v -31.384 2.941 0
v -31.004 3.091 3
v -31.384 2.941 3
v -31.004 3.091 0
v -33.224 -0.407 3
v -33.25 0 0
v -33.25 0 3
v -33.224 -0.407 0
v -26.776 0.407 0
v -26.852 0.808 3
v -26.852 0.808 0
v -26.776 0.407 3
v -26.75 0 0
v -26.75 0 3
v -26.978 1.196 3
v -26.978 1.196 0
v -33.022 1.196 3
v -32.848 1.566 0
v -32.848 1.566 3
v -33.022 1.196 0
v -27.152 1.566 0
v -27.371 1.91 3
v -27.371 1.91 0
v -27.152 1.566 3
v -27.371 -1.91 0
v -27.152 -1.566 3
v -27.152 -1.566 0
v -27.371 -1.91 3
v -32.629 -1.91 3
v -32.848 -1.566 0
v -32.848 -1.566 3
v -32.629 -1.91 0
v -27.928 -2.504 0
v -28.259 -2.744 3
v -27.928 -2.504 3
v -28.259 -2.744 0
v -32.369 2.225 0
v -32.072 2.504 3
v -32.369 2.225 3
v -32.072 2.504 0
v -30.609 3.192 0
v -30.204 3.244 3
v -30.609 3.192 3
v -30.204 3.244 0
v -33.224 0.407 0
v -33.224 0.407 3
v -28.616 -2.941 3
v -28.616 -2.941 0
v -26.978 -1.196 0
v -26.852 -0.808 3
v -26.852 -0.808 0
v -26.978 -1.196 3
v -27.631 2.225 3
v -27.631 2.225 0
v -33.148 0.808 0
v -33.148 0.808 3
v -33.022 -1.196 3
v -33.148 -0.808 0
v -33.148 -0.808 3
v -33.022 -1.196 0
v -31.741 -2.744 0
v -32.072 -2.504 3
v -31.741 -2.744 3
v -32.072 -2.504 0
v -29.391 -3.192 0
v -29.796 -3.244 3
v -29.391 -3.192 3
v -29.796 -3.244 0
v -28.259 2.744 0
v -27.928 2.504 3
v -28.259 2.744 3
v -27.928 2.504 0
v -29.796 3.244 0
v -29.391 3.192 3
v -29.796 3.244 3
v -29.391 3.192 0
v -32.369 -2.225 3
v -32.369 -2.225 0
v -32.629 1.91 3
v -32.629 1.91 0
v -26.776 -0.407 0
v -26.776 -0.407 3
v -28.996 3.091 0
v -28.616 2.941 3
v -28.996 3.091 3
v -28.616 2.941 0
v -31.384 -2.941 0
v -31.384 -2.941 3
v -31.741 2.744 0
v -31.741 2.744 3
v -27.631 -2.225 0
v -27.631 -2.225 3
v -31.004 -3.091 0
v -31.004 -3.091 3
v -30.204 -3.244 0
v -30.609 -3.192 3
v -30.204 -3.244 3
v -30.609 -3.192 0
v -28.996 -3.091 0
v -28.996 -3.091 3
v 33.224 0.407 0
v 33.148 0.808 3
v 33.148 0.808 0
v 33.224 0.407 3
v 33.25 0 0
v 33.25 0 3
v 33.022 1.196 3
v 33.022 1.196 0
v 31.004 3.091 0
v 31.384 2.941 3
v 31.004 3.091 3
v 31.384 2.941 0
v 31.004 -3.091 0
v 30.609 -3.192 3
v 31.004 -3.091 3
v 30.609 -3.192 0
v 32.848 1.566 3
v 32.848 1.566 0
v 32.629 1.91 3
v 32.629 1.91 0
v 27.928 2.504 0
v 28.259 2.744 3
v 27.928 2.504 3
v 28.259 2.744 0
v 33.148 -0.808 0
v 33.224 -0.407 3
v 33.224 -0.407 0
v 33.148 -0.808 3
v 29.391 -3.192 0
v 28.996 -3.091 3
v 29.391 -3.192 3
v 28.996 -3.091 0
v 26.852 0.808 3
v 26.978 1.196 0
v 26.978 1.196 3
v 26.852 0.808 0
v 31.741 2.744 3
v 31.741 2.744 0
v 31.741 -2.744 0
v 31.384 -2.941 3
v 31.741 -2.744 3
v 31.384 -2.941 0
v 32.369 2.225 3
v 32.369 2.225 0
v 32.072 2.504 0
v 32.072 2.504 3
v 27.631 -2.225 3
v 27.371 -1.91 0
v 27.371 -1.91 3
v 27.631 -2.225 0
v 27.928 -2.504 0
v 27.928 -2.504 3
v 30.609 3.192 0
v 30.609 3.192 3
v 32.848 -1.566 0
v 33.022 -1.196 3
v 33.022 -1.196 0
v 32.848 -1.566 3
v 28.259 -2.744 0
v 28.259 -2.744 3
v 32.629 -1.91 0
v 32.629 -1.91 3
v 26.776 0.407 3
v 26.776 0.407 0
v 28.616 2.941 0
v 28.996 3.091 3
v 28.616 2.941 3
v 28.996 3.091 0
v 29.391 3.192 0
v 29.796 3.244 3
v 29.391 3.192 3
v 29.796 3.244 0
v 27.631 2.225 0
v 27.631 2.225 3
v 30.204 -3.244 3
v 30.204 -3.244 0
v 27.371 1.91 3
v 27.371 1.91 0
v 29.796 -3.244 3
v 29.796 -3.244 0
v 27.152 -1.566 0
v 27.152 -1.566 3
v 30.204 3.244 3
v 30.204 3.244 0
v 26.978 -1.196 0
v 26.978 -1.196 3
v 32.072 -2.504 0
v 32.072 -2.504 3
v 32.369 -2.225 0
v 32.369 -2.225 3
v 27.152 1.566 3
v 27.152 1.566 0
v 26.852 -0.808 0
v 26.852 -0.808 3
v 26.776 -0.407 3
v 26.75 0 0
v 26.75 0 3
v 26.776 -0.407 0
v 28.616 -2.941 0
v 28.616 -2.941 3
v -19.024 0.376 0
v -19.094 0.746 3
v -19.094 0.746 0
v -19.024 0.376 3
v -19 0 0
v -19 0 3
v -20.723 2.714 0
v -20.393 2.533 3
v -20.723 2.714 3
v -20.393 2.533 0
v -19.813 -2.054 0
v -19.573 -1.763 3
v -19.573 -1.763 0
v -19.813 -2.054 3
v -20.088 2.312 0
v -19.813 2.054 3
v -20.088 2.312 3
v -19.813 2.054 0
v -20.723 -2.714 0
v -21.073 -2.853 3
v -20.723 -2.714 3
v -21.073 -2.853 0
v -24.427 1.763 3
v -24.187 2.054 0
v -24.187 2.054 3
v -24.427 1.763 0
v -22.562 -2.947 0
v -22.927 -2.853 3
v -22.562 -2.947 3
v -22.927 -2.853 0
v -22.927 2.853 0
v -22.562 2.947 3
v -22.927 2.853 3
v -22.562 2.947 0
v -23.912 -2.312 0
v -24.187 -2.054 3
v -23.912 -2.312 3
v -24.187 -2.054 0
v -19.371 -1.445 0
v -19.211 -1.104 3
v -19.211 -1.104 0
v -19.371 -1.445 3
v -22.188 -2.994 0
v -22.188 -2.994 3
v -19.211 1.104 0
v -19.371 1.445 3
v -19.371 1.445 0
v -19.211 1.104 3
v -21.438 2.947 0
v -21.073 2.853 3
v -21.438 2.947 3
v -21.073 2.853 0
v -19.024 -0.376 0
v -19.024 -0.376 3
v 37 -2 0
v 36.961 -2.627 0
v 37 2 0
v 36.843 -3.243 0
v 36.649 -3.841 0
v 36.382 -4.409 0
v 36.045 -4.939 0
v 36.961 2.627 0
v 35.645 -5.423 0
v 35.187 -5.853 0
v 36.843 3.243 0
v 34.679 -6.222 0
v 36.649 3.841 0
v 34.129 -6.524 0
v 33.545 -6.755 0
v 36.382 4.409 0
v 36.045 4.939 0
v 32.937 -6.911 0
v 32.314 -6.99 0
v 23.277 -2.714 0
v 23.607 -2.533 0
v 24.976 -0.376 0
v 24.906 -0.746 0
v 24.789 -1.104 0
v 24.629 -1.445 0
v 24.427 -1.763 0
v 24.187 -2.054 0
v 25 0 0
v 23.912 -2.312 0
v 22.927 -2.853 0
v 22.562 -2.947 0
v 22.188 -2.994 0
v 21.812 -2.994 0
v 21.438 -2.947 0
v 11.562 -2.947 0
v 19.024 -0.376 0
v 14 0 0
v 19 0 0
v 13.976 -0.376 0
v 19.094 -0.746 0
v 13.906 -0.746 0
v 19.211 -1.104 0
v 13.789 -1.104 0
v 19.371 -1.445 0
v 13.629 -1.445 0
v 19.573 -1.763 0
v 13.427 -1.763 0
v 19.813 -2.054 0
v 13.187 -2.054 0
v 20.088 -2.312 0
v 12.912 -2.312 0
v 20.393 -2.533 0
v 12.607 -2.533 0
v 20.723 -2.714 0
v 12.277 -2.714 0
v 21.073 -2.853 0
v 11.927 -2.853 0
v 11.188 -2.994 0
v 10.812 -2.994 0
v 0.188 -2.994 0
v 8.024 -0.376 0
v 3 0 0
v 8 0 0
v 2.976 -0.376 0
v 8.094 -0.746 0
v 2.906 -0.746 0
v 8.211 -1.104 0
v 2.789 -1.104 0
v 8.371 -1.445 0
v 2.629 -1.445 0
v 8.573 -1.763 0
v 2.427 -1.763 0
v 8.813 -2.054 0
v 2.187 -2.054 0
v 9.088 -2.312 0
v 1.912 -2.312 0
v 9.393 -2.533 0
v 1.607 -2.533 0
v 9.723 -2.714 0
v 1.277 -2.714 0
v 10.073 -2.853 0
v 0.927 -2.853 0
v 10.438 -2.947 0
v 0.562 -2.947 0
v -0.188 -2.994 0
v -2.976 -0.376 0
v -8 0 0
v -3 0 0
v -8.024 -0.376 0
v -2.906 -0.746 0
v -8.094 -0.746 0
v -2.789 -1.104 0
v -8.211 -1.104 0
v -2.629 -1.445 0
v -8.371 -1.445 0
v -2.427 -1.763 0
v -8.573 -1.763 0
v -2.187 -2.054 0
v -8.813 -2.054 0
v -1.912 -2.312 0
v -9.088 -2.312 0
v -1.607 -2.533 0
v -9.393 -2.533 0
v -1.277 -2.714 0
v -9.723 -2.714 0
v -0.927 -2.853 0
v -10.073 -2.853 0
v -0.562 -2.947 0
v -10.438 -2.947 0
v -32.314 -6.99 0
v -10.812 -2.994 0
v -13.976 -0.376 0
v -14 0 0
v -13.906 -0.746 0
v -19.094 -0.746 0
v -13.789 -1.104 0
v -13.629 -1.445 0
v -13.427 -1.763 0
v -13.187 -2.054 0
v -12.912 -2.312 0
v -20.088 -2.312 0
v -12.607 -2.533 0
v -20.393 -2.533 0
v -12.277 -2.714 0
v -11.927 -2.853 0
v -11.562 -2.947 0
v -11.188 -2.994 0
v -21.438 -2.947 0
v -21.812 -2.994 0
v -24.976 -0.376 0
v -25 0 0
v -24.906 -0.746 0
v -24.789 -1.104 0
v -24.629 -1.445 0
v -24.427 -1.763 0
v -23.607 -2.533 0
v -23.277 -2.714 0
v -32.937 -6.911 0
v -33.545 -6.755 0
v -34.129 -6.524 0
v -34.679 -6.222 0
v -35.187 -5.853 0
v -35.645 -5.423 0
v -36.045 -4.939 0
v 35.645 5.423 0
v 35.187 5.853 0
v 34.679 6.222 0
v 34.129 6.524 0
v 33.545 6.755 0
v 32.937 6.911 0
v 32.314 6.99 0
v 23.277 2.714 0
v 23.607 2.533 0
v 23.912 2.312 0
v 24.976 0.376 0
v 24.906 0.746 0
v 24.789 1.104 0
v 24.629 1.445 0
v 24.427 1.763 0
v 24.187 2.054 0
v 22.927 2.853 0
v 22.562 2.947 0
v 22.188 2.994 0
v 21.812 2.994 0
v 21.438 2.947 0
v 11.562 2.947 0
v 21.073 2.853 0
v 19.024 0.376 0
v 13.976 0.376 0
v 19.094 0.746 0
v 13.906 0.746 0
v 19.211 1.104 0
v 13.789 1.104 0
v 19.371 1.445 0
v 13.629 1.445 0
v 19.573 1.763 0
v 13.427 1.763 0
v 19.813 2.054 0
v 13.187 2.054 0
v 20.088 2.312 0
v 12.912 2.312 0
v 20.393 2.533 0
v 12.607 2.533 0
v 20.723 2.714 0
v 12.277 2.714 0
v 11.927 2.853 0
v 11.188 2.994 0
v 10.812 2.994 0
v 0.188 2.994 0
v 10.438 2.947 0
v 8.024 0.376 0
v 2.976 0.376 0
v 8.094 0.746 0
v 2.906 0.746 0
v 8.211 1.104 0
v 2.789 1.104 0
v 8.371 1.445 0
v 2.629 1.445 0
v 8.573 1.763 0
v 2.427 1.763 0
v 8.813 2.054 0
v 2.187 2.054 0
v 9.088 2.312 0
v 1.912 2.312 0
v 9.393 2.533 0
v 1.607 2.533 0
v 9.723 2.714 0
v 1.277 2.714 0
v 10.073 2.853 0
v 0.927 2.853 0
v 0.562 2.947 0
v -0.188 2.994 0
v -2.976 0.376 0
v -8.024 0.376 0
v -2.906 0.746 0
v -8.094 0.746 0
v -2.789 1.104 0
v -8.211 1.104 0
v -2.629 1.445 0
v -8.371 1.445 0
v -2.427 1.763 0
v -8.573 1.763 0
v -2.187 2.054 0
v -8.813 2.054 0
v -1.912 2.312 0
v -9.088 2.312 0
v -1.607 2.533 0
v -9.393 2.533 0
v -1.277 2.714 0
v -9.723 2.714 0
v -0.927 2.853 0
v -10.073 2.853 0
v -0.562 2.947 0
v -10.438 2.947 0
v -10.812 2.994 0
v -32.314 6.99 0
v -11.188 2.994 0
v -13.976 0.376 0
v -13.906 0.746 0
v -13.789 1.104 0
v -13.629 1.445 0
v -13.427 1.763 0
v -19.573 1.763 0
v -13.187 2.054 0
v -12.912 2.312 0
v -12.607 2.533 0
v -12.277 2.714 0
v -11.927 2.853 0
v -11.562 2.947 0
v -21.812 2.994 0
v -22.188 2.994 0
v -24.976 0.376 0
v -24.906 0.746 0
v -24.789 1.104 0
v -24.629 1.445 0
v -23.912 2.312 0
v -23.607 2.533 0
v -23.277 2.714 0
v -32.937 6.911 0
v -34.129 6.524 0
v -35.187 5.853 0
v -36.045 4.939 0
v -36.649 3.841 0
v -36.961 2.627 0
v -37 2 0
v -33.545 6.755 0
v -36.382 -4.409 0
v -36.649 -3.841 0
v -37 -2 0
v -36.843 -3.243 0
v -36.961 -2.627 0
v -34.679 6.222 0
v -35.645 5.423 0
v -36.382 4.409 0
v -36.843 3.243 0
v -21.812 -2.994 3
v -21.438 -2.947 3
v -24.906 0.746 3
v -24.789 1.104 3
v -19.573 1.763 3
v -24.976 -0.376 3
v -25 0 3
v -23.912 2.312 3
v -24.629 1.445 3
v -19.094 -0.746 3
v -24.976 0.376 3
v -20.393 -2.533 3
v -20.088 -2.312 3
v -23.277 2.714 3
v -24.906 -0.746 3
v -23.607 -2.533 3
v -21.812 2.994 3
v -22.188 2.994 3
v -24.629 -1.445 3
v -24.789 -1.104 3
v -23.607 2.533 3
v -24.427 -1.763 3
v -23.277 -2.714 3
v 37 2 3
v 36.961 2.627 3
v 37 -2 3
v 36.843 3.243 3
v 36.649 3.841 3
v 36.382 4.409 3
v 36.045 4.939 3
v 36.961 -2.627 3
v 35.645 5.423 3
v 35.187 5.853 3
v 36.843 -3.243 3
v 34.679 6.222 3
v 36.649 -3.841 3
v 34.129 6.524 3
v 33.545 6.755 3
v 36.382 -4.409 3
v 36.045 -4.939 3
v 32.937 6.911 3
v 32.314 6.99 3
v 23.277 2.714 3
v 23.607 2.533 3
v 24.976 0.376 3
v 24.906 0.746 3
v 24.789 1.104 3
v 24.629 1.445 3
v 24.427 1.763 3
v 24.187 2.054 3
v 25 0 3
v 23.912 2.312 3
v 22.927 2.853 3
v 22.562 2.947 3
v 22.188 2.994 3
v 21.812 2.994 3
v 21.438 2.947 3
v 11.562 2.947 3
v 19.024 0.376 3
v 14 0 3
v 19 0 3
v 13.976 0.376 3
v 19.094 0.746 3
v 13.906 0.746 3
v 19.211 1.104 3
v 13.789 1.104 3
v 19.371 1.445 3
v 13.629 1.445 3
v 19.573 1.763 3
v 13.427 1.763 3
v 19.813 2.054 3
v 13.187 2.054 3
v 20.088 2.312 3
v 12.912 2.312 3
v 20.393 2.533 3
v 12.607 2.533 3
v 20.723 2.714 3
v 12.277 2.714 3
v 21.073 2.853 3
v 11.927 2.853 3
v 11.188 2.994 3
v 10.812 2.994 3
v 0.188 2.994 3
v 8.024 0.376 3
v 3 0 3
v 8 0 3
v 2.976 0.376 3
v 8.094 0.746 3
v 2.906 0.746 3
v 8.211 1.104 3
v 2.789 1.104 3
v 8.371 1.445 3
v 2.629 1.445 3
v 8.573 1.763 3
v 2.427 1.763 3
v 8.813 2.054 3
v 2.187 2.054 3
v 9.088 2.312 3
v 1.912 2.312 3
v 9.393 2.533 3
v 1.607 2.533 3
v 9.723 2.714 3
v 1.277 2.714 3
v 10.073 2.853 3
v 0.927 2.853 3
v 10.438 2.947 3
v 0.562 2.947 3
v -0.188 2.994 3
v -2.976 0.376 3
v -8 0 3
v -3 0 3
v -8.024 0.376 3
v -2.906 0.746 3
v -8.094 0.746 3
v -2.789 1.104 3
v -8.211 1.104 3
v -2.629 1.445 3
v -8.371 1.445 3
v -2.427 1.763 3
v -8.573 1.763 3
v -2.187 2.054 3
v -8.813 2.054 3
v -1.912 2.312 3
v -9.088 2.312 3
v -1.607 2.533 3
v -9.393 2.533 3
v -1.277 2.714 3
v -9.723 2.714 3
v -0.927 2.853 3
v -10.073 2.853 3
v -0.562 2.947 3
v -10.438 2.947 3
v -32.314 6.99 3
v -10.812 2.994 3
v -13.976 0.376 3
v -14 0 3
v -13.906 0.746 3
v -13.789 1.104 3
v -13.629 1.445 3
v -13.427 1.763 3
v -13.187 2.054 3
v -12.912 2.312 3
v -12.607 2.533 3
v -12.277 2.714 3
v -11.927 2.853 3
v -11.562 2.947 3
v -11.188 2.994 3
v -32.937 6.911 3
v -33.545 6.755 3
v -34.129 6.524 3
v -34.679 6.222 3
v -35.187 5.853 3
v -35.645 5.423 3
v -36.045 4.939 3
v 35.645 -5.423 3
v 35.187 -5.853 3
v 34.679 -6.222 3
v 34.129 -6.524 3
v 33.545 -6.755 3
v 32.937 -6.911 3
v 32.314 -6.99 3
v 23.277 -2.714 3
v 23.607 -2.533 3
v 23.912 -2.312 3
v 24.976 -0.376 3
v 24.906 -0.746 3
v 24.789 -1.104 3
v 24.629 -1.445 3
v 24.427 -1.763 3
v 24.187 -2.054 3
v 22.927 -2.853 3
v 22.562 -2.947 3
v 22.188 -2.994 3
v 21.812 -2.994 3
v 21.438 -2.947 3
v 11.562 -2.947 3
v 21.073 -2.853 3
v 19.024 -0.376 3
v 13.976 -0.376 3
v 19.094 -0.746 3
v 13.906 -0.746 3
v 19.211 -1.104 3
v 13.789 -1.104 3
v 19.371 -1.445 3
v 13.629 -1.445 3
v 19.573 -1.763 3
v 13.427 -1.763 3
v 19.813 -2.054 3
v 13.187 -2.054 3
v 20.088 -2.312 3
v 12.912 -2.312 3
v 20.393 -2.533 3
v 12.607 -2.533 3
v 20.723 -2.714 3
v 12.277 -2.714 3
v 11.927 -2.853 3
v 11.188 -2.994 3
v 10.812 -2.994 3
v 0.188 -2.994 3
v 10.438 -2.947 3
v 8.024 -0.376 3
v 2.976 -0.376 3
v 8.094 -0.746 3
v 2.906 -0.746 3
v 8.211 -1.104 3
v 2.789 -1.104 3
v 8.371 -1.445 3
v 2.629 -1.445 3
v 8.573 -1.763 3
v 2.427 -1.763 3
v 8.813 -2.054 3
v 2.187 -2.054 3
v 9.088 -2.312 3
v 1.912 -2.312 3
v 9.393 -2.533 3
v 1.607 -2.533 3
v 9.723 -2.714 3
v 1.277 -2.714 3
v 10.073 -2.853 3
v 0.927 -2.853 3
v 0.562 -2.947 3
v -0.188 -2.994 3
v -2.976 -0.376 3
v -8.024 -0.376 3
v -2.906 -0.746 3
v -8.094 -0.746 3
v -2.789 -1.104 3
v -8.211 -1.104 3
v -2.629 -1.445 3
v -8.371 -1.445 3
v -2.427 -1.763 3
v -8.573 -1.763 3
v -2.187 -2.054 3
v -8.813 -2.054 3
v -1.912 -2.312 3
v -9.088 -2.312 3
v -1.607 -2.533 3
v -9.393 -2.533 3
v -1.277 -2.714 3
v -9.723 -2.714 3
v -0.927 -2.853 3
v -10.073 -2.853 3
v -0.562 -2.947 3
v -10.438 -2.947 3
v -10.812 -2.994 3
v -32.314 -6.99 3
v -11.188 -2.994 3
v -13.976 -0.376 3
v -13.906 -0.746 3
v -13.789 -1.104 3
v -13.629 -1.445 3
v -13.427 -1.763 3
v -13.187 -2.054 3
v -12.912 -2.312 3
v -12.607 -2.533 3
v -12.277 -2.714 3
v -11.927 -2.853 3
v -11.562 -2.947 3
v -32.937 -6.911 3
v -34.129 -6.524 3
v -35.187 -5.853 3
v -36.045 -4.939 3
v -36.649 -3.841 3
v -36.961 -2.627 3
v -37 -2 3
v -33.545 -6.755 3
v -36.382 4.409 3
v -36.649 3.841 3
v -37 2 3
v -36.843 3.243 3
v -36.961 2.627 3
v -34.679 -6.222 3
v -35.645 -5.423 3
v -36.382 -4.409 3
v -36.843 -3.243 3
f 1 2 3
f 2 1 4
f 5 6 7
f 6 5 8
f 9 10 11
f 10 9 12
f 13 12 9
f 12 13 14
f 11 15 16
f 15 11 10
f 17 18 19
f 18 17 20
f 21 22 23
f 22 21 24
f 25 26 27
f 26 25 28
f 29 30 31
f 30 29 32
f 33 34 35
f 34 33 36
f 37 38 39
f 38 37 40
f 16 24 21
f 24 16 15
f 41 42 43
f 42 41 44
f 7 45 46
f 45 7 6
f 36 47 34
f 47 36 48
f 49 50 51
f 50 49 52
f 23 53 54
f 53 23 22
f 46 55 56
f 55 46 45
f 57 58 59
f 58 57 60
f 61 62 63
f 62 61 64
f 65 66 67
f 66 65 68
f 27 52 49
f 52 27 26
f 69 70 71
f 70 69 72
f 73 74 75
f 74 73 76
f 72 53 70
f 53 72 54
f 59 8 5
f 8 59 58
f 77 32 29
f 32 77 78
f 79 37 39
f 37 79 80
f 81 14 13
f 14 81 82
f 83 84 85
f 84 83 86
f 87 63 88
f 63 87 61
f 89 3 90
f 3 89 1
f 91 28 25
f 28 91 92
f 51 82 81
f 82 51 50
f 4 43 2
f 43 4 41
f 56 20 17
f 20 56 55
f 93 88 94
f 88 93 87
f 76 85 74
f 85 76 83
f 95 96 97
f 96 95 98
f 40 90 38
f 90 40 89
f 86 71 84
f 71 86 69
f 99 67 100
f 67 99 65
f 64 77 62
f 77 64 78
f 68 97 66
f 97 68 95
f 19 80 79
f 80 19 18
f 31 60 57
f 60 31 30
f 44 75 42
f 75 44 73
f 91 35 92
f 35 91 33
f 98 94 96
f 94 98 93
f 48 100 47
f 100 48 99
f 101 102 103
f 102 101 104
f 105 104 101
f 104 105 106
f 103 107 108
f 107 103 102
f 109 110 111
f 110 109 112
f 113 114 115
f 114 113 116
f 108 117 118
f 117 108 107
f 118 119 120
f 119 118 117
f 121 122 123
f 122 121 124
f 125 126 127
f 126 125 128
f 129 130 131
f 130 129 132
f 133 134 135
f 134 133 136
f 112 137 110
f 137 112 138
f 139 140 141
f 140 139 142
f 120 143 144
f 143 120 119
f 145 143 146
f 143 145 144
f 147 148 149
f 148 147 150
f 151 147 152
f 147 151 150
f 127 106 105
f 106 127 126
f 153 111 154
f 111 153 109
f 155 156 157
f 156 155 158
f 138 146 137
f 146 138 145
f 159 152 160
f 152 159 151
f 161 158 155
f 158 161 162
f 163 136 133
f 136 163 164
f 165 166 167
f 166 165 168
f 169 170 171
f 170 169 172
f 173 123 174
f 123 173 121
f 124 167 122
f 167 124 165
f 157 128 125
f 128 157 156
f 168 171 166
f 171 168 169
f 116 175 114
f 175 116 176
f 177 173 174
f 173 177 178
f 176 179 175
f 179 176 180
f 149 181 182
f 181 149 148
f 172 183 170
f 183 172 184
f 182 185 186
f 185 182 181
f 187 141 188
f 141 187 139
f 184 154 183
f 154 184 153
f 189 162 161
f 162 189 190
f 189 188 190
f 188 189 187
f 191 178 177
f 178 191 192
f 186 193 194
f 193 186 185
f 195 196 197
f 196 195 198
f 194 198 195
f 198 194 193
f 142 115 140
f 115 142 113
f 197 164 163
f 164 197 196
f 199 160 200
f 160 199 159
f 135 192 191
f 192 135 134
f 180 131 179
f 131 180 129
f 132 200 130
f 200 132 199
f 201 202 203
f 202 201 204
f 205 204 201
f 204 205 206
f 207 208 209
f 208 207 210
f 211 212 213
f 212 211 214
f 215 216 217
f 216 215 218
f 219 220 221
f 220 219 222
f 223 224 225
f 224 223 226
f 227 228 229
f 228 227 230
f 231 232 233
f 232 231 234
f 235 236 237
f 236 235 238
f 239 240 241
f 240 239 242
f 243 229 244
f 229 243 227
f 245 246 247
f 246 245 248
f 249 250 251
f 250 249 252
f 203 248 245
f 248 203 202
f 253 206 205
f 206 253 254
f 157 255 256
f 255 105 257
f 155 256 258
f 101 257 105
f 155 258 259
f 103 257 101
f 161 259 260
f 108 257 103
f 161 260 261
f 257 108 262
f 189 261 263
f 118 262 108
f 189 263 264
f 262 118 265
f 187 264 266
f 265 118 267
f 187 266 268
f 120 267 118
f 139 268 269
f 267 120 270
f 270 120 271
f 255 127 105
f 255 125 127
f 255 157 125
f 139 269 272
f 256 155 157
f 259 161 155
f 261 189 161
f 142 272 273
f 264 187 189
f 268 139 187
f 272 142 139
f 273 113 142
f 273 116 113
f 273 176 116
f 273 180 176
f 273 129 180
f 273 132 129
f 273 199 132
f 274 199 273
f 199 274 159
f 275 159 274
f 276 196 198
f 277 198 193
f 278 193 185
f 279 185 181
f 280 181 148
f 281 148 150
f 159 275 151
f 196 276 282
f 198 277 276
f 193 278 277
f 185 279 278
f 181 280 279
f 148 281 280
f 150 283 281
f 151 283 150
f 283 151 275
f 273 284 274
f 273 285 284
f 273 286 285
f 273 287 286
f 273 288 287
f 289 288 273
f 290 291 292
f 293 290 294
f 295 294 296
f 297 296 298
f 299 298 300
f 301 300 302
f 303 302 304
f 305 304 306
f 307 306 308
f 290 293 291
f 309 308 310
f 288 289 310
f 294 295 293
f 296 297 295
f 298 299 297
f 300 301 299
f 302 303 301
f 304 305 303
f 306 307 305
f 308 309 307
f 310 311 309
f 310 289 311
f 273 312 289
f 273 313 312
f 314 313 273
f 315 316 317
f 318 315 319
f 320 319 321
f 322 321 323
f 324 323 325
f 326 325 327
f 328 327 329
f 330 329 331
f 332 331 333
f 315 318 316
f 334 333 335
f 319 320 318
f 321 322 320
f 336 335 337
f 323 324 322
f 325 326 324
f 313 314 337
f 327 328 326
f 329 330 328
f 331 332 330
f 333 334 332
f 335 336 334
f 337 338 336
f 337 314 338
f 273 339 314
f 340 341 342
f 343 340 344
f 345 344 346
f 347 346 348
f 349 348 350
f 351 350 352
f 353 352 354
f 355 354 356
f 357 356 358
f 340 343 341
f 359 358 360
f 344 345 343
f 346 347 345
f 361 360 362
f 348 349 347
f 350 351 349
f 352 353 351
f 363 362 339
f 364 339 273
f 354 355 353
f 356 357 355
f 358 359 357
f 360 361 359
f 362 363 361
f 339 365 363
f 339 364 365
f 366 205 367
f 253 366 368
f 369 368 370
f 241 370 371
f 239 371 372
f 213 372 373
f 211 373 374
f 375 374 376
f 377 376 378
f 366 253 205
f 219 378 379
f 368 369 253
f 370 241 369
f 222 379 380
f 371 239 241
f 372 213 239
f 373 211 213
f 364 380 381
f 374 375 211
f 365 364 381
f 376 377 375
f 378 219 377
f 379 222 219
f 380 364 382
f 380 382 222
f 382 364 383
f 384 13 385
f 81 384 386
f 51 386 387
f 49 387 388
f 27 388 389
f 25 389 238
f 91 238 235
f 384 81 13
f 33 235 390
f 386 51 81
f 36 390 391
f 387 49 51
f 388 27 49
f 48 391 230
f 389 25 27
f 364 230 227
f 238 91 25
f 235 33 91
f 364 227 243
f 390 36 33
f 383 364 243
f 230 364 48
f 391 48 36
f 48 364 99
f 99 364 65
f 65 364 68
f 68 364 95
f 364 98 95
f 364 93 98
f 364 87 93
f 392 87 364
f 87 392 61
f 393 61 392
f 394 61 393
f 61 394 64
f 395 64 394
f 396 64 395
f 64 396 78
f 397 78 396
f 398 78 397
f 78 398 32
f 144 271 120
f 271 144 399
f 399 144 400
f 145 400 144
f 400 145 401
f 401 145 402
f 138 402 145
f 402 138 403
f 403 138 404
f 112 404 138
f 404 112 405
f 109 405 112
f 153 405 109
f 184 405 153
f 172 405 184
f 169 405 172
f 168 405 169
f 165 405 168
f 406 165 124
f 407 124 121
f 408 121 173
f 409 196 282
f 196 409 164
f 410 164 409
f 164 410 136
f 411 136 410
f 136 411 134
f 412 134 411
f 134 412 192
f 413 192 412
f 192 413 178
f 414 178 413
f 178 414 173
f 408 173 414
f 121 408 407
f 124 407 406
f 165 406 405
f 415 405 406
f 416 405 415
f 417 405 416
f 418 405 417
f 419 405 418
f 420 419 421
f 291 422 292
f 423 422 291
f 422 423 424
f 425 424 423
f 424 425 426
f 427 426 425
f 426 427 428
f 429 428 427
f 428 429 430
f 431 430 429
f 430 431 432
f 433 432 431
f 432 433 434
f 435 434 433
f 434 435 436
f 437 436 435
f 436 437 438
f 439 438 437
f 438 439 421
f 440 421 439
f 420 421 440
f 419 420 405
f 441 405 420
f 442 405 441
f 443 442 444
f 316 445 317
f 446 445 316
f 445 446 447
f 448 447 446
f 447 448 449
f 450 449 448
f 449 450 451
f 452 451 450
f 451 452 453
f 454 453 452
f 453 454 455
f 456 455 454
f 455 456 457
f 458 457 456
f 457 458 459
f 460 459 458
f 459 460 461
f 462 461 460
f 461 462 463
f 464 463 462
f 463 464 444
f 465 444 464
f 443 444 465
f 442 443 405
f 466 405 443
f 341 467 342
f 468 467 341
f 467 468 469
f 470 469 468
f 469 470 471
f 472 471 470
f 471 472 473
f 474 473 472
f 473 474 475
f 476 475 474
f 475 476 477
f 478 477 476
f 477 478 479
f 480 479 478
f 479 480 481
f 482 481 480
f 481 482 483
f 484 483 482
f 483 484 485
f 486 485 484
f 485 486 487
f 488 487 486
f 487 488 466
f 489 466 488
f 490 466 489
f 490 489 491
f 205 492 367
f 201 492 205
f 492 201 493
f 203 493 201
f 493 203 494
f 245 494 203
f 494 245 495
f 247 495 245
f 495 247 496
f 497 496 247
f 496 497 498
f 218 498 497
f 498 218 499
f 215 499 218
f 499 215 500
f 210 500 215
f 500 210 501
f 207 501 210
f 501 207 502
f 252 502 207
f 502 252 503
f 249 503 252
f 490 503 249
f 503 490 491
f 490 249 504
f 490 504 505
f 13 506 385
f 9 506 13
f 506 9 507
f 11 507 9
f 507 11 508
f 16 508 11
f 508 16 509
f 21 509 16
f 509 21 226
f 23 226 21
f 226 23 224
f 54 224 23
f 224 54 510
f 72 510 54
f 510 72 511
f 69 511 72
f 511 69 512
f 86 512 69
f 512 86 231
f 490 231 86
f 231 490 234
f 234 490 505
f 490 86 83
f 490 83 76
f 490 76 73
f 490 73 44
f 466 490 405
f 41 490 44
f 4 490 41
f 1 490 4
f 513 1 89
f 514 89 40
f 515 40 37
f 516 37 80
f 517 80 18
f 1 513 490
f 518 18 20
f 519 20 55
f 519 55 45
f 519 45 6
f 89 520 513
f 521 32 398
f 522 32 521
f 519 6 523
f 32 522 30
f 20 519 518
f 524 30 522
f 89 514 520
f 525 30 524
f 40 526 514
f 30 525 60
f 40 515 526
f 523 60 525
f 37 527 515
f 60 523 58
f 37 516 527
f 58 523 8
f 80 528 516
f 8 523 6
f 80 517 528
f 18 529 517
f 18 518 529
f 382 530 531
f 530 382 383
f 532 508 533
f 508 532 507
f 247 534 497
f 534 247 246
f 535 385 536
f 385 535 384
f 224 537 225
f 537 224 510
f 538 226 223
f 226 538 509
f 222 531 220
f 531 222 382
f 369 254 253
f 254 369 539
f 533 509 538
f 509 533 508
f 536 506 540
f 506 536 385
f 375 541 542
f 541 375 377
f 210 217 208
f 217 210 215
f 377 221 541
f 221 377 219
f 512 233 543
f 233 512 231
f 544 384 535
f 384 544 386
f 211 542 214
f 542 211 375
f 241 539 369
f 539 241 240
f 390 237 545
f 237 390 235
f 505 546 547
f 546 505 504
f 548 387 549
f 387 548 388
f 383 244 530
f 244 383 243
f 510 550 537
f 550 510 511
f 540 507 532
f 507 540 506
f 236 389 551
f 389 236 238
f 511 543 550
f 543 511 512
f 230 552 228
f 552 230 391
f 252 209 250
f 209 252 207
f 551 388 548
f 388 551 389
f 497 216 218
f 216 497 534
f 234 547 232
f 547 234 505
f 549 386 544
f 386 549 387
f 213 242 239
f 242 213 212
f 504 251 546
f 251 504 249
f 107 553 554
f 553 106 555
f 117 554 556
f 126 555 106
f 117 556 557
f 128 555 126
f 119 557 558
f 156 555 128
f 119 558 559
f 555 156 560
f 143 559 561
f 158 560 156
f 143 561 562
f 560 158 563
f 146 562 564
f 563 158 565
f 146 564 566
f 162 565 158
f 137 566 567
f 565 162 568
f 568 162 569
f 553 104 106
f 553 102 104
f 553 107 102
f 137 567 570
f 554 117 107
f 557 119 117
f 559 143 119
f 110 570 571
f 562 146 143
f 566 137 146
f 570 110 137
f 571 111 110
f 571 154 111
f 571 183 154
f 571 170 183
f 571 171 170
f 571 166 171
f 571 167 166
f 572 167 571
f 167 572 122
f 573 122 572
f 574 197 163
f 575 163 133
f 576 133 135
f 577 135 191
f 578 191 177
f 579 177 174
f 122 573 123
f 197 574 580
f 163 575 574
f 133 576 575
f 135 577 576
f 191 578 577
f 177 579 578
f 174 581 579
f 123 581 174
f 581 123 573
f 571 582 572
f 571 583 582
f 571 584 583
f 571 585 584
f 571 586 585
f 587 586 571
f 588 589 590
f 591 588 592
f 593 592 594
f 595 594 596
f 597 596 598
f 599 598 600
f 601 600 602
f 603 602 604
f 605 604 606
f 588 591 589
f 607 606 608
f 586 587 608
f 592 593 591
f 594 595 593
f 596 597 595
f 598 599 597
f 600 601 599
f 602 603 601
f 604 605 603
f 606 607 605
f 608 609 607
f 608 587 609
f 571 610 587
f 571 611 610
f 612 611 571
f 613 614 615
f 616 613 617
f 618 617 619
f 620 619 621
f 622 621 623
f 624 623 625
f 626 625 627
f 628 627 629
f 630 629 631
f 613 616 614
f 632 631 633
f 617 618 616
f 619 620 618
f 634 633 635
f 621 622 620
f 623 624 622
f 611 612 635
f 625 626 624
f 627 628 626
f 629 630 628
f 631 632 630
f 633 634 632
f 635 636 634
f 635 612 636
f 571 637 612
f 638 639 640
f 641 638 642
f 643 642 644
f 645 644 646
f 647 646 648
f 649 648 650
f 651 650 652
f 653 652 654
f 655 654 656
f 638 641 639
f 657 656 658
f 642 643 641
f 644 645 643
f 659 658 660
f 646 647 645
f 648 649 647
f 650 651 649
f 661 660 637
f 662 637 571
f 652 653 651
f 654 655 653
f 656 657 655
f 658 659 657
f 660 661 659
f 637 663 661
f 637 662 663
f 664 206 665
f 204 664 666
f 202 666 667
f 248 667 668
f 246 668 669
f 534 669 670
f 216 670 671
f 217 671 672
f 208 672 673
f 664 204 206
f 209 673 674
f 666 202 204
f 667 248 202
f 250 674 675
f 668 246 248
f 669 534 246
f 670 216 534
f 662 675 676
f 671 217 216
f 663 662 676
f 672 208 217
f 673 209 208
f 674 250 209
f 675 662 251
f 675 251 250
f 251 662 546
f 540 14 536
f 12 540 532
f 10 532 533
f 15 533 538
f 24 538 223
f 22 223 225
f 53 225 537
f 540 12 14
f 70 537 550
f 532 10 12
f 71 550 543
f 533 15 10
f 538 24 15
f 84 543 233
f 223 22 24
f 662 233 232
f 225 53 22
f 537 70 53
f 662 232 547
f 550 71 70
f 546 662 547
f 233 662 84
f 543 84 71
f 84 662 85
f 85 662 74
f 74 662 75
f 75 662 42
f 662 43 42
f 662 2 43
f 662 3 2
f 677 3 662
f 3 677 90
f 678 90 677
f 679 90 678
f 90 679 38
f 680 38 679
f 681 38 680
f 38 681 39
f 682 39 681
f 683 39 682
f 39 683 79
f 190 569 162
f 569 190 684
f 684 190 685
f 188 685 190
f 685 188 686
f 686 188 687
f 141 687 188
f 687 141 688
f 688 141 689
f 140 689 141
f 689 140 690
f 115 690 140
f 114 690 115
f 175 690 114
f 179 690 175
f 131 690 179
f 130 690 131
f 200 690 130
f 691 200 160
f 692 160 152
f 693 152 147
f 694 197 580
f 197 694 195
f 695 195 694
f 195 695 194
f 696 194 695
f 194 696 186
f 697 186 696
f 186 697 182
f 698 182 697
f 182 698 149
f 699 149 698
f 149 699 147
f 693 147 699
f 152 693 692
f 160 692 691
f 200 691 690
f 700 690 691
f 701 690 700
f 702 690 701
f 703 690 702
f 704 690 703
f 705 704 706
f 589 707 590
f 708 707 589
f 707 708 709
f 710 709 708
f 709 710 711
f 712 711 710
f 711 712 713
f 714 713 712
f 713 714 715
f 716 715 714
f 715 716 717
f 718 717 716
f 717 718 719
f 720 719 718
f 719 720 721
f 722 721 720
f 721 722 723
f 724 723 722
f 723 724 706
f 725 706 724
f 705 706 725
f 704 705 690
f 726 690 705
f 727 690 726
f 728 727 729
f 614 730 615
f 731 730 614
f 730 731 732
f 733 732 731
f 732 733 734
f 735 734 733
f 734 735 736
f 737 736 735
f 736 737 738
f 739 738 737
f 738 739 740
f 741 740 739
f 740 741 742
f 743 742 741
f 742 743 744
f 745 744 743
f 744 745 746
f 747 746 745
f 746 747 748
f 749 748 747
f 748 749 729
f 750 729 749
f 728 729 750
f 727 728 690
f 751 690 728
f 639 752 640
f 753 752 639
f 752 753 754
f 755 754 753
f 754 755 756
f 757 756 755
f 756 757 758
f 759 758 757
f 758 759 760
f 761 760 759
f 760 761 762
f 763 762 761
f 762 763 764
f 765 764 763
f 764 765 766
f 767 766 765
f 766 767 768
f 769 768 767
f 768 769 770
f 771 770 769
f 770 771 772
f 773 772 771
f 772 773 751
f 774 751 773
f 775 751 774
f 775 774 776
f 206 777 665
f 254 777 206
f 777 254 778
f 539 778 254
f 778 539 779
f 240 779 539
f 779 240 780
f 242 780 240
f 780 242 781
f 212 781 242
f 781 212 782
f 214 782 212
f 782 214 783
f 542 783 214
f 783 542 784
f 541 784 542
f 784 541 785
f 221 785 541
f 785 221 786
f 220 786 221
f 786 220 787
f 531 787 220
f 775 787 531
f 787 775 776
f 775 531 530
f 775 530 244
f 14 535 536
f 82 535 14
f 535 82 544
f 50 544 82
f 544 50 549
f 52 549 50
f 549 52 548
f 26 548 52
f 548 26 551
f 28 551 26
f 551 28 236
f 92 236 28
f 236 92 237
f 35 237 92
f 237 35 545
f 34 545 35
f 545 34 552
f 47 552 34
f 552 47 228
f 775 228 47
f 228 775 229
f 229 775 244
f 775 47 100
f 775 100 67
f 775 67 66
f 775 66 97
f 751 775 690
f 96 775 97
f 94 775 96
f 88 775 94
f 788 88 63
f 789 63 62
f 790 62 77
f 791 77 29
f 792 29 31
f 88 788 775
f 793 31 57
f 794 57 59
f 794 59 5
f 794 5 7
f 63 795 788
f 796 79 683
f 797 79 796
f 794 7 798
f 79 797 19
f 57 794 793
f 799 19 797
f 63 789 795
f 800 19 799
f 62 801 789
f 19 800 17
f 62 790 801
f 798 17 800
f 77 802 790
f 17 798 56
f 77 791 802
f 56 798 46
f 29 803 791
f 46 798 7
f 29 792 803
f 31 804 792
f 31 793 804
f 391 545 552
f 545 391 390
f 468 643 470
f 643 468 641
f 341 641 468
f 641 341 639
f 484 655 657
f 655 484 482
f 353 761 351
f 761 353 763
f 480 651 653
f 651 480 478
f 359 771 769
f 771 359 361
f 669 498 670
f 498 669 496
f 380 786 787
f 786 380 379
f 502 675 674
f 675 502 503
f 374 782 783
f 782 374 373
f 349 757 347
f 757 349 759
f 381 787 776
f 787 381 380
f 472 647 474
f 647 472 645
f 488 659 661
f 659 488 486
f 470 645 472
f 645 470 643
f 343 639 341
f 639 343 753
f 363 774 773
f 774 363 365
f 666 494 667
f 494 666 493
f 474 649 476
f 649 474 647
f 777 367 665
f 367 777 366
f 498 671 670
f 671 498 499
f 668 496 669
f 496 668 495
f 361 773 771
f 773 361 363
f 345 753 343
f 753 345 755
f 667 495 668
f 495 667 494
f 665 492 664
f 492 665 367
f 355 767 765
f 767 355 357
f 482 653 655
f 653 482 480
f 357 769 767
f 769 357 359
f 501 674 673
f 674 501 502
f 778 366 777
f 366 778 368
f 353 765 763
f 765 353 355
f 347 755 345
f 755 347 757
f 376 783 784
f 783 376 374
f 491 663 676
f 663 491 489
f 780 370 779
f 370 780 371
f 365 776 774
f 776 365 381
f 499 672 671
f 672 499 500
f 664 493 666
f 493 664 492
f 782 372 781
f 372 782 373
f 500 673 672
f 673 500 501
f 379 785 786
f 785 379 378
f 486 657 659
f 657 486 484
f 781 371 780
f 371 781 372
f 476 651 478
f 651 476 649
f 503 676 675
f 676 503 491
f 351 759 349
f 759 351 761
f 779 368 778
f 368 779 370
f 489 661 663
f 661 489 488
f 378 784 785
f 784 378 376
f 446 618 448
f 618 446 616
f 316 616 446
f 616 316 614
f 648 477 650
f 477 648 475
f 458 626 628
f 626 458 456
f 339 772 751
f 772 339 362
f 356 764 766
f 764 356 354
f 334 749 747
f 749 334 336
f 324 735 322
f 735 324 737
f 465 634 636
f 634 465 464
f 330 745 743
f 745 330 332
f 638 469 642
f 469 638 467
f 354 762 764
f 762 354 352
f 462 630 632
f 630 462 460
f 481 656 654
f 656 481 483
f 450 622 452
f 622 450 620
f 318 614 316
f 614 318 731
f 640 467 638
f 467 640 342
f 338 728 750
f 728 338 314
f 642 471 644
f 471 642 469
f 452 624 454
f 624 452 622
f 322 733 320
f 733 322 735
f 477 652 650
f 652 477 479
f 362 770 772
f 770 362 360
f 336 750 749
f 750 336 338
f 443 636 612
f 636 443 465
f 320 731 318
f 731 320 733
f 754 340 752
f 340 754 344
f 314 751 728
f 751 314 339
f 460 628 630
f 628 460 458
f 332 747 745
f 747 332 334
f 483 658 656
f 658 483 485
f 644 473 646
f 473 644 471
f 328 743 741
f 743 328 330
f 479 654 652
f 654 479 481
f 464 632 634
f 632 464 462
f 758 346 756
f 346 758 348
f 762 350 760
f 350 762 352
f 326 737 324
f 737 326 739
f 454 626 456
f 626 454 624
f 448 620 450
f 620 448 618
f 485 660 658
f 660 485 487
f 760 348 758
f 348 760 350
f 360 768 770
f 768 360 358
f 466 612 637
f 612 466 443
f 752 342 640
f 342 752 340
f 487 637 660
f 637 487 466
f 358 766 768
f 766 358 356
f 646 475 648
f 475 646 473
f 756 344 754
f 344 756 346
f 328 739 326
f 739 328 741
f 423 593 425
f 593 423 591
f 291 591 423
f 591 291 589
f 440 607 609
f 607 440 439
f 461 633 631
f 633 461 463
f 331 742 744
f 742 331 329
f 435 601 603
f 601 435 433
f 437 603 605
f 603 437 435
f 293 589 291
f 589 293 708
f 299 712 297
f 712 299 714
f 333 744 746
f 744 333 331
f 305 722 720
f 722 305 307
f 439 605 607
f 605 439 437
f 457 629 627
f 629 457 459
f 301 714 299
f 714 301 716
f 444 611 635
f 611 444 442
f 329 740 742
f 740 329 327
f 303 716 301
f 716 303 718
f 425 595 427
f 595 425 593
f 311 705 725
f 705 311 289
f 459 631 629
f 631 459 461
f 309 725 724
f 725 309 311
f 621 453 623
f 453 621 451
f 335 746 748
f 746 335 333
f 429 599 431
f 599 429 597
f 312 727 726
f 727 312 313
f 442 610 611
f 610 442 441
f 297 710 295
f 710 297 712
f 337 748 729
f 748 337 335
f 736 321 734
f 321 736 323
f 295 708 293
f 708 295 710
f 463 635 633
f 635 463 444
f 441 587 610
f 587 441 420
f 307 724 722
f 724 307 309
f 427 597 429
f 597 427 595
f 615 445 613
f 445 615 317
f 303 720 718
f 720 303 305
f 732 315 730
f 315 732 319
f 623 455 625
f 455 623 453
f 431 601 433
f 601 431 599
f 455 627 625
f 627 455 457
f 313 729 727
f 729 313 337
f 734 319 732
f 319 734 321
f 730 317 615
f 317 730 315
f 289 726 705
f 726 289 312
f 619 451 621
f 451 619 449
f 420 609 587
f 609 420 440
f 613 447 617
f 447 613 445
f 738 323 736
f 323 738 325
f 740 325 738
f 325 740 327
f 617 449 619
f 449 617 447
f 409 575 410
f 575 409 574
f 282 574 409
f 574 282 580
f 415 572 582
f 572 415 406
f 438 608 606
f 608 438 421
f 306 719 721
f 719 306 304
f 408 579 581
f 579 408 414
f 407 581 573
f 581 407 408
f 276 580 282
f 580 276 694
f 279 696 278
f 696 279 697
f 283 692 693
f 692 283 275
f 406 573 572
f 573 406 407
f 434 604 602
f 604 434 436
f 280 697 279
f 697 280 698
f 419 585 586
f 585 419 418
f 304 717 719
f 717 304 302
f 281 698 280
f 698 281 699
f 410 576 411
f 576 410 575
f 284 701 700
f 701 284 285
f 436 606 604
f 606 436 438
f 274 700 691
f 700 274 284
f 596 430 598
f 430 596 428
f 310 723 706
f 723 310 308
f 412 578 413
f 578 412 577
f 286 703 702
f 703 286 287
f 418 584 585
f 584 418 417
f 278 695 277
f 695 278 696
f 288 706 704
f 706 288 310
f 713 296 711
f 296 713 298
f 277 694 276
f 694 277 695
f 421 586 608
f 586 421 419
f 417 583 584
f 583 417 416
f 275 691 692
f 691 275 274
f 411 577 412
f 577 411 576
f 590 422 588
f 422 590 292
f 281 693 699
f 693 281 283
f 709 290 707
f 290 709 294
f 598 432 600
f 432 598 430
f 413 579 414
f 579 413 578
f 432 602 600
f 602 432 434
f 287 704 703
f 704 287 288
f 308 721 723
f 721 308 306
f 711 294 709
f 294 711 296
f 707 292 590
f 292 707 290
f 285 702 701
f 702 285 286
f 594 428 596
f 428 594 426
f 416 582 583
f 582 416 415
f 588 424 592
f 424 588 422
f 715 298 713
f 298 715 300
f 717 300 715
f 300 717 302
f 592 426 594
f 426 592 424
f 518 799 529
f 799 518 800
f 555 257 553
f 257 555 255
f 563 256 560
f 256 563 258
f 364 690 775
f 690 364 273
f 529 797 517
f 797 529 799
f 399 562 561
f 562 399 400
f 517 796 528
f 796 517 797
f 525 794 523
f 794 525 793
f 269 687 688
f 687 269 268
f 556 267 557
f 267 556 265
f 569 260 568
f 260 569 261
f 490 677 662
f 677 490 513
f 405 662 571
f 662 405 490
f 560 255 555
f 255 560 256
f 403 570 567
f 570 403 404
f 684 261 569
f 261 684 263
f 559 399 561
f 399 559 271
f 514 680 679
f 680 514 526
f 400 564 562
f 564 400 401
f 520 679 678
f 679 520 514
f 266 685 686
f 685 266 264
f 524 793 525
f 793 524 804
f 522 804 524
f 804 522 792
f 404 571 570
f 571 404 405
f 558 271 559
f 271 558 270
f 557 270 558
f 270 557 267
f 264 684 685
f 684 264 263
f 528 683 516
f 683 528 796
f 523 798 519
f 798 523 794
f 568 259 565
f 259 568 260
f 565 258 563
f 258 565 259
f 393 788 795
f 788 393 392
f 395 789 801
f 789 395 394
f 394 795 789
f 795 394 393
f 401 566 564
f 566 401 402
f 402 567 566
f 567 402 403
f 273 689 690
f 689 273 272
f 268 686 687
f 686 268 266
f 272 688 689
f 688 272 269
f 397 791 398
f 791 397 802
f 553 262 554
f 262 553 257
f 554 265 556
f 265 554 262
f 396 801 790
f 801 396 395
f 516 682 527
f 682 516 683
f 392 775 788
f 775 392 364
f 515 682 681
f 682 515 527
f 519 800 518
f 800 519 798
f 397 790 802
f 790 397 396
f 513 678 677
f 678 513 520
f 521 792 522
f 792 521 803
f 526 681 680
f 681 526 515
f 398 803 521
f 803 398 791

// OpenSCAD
$fn = 50;


difference() {
	union() {
		hull() {
			translate(v = [-32.0000000000, 2.0000000000, 0]) {
				cylinder(h = 3, r = 5);
			}
			translate(v = [32.0000000000, 2.0000000000, 0]) {
				cylinder(h = 3, r = 5);
			}
			translate(v = [-32.0000000000, -2.0000000000, 0]) {
				cylinder(h = 3, r = 5);
			}
			translate(v = [32.0000000000, -2.0000000000, 0]) {
				cylinder(h = 3, r = 5);
			}
		}
	}
	union() {
		#translate(v = [-30.0000000000, 0.0000000000, 0]) {
			cylinder(h = 3, r = 3.2500000000);
		}
		#translate(v = [30.0000000000, 0.0000000000, 0]) {
			cylinder(h = 3, r = 3.2500000000);
		}
		#translate(v = [-30.0000000000, 0.0000000000, -100.0000000000]) {
			cylinder(h = 200, r = 3.2500000000);
		}
		#translate(v = [-30.0000000000, 0.0000000000, -100.0000000000]) {
			cylinder(h = 200, r = 3.2500000000);
		}
		#translate(v = [30.0000000000, 0.0000000000, -100.0000000000]) {
			cylinder(h = 200, r = 3.2500000000);
		}
		#translate(v = [30.0000000000, 0.0000000000, -100.0000000000]) {
			cylinder(h = 200, r = 3.2500000000);
		}
		#translate(v = [-30.0000000000, 0.0000000000, 0]) {
			cylinder(h = 3, r = 1.8000000000);
		}
		#translate(v = [30.0000000000, 0.0000000000, 0]) {
			cylinder(h = 3, r = 1.8000000000);
		}
		#translate(v = [-30.0000000000, 0.0000000000, 0]) {
			cylinder(h = 3, r = 1.8000000000);
		}
		#translate(v = [30.0000000000, 0.0000000000, 0]) {
			cylinder(h = 3, r = 1.8000000000);
		}
		#translate(v = [-30.0000000000, 0.0000000000, 0]) {
			cylinder(h = 3, r = 1.8000000000);
		}
		#translate(v = [30.0000000000, 0.0000000000, 0]) {
			cylinder(h = 3, r = 1.8000000000);
		}
		#translate(v = [-22.0000000000, 0, 0]) {
			cylinder(h = 3, r = 3.0000000000);
		}
		#translate(v = [-11.0000000000, 0, 0]) {
			cylinder(h = 3, r = 3.0000000000);
		}
		#cylinder(h = 3, r = 3.0000000000);
		#translate(v = [11.0000000000, 0, 0]) {
			cylinder(h = 3, r = 3.0000000000);
		}
		#translate(v = [22.0000000000, 0, 0]) {
			cylinder(h = 3, r = 3.0000000000);
		}
	}
}
